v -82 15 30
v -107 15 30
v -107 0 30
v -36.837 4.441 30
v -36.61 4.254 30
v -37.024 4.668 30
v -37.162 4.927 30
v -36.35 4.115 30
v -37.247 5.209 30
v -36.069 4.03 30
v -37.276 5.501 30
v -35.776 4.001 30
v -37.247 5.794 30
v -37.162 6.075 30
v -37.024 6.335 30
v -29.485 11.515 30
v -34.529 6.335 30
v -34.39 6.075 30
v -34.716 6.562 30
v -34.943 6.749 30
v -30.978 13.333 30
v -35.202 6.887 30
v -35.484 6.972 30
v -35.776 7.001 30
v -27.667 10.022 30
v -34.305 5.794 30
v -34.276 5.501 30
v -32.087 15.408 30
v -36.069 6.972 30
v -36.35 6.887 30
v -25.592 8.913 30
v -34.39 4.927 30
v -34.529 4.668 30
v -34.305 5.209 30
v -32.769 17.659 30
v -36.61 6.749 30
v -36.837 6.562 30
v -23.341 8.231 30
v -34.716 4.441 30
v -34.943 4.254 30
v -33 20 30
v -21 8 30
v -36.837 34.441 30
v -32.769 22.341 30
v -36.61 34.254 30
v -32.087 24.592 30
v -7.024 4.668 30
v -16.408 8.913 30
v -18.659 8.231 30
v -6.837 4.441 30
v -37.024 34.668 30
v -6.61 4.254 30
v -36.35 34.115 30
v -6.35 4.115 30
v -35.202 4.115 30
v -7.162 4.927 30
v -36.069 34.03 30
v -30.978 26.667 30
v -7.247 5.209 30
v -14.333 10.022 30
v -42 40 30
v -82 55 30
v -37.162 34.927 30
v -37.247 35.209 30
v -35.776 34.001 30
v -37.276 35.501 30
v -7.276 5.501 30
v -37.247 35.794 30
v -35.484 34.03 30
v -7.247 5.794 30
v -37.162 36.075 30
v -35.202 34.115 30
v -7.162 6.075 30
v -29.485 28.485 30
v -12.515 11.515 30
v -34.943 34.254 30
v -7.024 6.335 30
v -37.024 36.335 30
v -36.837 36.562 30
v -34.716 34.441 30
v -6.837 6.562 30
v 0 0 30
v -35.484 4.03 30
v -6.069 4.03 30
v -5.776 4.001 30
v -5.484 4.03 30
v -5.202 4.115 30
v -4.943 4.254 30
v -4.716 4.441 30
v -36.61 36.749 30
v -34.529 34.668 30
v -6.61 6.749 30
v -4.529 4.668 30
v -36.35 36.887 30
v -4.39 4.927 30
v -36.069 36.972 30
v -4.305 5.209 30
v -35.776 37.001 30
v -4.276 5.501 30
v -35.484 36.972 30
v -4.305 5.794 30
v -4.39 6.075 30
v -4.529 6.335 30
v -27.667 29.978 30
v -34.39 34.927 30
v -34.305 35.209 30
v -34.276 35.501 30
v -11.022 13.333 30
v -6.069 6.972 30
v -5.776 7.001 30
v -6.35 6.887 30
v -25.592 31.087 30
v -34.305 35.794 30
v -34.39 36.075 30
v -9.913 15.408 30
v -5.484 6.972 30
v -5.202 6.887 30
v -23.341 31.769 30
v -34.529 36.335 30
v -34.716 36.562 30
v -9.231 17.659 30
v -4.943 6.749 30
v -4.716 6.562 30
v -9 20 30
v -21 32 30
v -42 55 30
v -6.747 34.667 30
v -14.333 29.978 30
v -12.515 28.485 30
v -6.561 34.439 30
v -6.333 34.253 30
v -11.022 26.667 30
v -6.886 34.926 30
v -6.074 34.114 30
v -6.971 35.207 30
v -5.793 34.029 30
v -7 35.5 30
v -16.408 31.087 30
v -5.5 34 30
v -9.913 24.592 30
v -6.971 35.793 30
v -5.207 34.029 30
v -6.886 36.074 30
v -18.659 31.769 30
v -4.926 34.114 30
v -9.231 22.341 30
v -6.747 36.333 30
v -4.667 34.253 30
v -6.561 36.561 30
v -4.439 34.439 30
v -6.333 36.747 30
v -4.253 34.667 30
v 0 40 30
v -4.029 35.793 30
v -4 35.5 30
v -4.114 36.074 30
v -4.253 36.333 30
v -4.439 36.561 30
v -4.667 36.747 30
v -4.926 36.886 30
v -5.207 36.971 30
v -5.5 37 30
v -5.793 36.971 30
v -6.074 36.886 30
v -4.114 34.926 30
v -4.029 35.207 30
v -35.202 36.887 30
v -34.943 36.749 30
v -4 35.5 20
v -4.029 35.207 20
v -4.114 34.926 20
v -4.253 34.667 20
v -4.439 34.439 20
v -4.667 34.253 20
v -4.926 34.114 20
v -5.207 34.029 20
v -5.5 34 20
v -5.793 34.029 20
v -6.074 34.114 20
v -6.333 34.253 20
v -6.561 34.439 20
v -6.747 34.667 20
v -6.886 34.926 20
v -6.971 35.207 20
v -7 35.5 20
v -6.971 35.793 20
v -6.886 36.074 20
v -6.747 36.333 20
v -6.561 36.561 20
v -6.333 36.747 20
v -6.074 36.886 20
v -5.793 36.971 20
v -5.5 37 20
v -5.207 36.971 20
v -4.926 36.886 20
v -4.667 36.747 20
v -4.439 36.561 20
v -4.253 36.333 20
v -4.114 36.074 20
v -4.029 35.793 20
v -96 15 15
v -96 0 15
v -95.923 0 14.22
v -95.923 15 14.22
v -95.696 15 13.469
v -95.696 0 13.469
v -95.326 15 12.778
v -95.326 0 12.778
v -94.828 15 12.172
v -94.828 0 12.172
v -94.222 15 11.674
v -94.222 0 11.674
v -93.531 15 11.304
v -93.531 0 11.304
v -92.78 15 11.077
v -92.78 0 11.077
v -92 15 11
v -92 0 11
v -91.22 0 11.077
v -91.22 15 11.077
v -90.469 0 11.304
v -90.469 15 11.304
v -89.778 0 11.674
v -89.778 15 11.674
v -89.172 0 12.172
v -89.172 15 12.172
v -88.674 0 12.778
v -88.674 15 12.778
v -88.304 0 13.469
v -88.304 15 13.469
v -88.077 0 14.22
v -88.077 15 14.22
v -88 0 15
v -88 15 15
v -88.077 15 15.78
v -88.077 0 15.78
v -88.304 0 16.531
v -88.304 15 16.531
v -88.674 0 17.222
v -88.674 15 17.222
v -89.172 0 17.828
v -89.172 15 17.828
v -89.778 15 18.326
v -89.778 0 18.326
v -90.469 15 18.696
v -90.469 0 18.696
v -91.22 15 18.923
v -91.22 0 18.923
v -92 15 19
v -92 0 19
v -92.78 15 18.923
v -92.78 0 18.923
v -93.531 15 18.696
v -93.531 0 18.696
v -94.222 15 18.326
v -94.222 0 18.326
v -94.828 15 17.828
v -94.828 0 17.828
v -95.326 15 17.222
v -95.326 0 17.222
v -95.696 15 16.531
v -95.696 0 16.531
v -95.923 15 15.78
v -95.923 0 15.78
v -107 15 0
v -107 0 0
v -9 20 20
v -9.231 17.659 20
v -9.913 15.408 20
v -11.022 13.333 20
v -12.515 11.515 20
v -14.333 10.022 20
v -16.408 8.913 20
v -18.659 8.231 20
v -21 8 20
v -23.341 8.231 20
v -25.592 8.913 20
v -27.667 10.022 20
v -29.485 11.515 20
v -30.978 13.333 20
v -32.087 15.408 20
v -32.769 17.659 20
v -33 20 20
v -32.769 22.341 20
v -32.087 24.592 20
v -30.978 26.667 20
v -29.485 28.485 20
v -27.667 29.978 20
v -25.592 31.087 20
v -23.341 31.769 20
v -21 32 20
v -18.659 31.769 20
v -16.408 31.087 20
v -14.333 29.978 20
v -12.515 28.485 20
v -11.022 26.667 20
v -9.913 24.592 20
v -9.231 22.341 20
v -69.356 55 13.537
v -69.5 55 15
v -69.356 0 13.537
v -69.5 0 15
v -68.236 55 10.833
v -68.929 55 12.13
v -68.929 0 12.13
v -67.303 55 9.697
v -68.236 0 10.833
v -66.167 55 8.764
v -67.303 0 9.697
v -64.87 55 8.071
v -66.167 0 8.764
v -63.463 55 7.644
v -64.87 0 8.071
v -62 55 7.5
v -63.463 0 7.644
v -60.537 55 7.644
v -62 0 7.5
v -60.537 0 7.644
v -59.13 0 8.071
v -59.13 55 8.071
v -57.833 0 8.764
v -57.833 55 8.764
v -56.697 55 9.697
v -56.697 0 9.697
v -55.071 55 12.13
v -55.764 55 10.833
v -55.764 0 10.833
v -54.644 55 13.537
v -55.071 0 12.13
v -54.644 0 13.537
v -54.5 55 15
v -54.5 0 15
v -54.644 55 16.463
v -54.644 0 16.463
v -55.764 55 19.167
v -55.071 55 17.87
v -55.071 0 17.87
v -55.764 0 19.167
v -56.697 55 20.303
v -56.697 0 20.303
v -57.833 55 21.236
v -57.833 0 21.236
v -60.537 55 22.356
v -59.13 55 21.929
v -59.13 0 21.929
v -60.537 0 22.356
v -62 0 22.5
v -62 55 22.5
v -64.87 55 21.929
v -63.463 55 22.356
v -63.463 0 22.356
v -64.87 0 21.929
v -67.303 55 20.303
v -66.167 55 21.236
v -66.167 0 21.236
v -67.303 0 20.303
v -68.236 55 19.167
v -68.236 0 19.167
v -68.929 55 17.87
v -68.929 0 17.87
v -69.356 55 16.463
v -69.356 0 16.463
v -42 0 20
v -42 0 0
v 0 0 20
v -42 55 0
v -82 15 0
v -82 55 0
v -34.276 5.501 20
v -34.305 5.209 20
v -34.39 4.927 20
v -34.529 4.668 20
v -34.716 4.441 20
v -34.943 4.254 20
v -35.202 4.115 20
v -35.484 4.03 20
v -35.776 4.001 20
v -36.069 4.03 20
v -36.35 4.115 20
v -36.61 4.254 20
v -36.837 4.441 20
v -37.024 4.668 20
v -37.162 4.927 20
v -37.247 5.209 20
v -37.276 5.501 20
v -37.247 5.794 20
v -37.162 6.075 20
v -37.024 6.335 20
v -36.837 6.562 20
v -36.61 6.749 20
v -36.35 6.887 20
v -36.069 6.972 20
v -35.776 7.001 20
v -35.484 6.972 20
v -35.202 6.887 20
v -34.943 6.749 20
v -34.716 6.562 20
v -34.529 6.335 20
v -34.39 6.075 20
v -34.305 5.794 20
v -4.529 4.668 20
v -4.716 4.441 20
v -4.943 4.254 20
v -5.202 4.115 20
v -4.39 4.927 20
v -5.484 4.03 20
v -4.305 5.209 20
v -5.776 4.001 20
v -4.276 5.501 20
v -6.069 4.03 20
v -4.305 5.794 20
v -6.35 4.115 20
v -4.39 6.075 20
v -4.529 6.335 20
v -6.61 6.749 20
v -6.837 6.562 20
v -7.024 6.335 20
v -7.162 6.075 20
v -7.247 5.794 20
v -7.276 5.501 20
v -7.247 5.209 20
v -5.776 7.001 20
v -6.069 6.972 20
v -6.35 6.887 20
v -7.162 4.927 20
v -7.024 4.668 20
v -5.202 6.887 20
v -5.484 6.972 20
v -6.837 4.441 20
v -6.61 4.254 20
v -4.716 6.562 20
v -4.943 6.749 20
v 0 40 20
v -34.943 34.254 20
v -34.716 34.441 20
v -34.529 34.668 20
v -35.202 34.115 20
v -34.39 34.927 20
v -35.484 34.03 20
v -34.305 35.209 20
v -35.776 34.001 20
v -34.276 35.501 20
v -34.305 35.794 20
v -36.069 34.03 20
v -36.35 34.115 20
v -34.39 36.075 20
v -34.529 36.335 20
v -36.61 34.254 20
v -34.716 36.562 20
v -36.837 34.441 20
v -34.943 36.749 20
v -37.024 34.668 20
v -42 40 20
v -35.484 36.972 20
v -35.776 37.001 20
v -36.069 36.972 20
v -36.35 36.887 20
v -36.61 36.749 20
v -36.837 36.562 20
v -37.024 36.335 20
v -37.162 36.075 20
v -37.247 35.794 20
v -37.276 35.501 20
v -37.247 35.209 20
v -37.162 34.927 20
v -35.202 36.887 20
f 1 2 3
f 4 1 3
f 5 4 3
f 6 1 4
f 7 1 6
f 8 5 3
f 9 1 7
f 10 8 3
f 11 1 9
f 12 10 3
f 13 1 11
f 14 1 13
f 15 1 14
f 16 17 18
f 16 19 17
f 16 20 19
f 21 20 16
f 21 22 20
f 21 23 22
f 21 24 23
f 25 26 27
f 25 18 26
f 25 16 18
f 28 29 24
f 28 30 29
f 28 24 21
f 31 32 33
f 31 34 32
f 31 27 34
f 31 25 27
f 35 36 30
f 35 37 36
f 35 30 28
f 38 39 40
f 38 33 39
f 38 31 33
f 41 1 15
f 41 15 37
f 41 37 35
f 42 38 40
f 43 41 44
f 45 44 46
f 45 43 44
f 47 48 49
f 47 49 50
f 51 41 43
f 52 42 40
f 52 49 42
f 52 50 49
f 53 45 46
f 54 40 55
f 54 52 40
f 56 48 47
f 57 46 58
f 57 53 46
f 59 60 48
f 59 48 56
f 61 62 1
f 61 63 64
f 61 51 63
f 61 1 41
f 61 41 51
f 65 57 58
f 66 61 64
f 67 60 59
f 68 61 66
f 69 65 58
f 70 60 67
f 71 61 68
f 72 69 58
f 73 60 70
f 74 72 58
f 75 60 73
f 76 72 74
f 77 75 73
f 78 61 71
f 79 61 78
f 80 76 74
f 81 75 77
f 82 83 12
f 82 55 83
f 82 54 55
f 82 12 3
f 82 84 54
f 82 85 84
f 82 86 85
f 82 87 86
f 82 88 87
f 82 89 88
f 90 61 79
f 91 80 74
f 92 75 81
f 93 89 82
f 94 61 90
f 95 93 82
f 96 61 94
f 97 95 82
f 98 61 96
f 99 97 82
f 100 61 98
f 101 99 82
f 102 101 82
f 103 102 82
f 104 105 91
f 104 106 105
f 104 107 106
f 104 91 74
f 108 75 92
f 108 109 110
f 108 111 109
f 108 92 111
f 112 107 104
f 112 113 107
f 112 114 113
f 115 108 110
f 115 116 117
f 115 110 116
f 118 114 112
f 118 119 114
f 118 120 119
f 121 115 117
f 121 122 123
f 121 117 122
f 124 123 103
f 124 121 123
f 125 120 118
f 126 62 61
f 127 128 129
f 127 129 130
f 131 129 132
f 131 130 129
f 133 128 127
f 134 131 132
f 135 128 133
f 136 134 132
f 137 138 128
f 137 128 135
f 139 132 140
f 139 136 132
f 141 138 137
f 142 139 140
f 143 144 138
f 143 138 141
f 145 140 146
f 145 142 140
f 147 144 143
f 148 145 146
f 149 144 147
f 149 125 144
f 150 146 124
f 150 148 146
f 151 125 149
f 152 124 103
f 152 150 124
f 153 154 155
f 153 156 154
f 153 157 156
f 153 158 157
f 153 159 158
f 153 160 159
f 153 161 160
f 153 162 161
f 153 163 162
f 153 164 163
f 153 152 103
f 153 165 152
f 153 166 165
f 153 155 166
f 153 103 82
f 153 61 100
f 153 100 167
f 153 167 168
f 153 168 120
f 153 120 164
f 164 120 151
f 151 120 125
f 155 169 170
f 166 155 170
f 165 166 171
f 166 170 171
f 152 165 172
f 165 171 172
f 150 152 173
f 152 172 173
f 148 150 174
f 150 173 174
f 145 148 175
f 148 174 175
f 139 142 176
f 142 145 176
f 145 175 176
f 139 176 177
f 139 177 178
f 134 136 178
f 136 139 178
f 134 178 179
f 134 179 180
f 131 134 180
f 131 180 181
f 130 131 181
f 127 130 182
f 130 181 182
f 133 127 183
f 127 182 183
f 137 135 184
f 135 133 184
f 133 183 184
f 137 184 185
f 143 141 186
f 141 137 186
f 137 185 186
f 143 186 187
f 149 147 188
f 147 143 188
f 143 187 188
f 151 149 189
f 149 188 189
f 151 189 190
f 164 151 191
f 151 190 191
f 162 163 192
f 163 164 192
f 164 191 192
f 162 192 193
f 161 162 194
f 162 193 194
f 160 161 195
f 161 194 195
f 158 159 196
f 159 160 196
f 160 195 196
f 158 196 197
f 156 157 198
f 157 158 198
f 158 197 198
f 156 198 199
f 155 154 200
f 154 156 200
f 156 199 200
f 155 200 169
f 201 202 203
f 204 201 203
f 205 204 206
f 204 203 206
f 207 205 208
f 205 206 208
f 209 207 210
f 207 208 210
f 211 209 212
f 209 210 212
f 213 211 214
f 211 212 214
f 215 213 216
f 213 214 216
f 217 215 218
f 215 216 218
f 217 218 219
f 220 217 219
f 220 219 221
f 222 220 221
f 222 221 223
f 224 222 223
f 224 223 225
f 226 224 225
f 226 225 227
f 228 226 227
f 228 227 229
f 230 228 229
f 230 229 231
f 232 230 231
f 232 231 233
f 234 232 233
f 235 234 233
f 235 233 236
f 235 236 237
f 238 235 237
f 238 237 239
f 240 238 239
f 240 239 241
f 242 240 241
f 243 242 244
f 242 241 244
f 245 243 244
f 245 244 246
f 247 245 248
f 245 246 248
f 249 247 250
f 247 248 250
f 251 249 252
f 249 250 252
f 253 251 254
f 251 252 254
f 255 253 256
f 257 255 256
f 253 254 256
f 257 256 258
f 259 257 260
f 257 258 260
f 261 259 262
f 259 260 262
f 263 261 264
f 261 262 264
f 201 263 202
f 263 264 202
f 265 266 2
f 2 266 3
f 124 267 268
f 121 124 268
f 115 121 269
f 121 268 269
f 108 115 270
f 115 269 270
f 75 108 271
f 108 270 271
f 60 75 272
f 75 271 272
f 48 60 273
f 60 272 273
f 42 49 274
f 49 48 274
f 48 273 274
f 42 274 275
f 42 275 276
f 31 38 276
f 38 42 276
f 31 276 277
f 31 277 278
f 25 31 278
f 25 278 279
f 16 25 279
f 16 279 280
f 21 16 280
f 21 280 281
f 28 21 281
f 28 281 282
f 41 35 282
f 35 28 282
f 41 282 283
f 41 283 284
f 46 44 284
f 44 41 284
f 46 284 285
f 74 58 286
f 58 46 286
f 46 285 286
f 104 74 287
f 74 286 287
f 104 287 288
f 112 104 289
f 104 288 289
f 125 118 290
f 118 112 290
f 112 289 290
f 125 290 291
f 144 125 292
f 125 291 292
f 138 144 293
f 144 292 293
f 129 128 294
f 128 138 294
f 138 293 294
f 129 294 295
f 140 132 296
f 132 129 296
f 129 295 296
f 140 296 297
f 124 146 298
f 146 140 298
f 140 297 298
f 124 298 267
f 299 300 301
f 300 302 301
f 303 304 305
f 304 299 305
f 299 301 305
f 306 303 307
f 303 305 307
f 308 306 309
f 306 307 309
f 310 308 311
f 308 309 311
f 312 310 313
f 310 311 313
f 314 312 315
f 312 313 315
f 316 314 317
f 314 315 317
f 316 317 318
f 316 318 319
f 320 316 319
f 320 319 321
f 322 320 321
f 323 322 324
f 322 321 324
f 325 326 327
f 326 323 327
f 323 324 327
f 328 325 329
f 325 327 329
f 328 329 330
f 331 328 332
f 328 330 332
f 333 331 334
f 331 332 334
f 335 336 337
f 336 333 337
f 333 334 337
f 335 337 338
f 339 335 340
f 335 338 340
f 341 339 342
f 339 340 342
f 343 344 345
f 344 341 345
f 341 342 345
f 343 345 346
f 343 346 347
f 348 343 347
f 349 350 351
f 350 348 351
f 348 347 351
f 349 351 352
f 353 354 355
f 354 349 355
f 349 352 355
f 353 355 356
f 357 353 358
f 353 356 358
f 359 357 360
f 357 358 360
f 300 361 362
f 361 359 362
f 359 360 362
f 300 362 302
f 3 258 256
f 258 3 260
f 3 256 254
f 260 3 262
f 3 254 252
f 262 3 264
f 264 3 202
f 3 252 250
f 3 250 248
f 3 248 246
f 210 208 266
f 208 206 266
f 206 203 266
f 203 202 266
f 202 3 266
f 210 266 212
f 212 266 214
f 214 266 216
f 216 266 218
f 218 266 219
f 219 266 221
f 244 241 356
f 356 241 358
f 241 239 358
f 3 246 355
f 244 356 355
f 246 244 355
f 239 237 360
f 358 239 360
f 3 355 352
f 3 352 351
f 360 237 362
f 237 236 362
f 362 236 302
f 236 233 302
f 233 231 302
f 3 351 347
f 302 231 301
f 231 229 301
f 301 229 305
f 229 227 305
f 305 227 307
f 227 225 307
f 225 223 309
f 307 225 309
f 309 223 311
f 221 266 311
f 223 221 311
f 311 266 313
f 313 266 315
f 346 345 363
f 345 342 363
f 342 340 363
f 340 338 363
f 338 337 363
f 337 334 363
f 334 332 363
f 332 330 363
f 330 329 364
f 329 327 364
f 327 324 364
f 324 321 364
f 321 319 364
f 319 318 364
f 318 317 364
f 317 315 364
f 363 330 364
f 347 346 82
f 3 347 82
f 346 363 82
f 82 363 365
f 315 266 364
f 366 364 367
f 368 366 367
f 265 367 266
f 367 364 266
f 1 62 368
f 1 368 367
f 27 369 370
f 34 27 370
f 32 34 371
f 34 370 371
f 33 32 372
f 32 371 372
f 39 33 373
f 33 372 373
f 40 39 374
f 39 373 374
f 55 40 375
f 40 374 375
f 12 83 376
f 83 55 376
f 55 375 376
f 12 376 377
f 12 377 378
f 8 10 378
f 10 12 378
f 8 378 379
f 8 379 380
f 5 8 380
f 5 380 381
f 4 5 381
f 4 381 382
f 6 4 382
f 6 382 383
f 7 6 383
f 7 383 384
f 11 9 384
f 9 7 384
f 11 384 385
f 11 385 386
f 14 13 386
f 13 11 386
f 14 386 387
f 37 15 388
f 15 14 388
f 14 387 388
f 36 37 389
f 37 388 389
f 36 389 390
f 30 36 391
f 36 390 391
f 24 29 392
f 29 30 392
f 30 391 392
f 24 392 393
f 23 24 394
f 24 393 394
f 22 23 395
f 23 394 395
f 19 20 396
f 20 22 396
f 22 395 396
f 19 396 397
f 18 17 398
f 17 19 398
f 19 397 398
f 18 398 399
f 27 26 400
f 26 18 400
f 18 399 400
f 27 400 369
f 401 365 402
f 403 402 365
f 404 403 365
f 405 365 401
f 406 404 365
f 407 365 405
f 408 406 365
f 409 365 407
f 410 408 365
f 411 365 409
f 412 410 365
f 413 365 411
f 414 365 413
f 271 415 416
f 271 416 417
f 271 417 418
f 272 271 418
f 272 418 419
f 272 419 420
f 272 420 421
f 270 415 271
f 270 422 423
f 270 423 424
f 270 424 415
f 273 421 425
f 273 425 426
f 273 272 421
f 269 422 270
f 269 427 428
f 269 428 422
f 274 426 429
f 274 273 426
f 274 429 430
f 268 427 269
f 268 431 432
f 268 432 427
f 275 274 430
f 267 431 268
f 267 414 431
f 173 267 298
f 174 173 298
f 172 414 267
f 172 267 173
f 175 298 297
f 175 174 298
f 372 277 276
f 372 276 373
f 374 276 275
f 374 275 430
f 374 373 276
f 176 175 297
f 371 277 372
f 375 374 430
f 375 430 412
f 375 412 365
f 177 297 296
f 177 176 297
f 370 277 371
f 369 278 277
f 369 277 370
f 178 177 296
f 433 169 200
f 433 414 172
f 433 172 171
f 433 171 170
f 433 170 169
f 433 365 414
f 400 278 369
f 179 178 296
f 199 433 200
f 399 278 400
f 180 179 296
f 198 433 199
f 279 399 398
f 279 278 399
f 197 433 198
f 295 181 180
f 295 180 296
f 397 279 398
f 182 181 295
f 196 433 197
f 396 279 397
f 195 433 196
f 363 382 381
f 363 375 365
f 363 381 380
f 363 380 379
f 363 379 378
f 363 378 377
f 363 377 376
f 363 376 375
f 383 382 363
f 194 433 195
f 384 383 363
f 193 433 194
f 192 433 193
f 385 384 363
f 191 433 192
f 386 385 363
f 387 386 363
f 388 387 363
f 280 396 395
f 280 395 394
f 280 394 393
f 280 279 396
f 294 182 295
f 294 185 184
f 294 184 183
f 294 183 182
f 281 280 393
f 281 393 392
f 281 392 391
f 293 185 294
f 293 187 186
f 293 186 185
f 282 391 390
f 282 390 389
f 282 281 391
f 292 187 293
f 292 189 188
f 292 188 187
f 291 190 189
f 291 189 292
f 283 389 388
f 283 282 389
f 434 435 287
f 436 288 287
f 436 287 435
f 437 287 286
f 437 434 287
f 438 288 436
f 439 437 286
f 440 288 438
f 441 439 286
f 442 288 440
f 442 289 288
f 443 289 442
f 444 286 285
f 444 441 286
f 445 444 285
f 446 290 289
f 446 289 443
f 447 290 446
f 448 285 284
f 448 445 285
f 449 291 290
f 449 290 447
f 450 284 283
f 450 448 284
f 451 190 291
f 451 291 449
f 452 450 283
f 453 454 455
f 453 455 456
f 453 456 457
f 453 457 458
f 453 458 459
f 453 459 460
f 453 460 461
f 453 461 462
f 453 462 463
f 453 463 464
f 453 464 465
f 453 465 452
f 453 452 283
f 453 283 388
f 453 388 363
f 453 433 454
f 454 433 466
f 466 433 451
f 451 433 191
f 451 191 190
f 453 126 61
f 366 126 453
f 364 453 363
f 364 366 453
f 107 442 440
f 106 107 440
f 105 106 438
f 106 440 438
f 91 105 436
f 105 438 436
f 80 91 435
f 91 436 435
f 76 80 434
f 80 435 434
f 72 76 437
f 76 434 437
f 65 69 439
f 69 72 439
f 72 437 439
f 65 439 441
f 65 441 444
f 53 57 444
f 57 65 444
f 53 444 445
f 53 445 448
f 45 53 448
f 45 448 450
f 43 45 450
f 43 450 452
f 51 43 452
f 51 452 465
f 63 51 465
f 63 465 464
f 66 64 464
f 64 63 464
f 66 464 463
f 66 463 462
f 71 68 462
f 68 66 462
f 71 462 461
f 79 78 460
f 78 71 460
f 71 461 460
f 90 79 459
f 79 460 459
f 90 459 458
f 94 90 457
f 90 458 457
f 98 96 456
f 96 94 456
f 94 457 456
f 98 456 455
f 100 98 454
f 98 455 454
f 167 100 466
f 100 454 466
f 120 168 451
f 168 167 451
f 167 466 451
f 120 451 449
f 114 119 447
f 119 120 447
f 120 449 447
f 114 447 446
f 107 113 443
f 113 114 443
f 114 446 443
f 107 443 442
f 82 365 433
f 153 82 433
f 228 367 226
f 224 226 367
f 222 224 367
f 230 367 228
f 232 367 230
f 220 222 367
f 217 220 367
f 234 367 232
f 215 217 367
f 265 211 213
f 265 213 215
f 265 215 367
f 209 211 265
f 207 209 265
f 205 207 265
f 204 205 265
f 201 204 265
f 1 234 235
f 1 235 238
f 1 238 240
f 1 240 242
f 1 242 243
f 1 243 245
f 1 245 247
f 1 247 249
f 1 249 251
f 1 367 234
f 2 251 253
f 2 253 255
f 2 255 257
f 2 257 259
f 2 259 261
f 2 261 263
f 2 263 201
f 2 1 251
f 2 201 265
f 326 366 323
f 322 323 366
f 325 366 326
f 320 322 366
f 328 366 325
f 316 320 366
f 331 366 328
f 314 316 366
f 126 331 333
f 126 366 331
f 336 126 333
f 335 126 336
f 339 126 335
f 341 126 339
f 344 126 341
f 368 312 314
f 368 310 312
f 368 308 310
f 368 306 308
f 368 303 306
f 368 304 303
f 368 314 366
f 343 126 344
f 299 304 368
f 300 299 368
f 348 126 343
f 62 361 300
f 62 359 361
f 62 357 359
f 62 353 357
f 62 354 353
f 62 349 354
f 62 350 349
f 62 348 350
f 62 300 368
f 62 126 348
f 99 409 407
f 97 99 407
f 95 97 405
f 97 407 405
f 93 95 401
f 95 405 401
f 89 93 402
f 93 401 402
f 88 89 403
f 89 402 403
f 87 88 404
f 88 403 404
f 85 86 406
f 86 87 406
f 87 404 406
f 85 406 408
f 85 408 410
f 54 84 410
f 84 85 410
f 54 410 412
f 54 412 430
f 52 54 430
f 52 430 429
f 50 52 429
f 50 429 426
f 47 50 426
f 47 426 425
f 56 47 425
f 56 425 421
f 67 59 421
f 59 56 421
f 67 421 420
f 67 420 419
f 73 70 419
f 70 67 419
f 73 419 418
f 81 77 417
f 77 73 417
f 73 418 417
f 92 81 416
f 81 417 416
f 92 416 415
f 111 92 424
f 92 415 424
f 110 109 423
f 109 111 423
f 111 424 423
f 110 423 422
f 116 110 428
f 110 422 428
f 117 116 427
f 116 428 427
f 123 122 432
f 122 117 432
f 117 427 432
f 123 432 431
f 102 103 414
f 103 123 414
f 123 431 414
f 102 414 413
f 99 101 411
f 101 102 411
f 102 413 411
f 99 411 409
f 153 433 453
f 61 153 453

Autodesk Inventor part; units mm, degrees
ref_plane "YZ Plane" through (0, 0, 0) normal (1, 0, 0) x (0, 1, 0)
ref_plane "XZ Plane" through (0, 0, 0) normal (0, 1, 0) x (-1, 0, 0)
ref_plane "XY Plane" through (0, 0, 0) normal (0, 0, 1) x (1, 0, 0)
sketch "Sketch1" plane through (0, 0, 0) normal (0, 1, 0) x (-1, 0, 0)
  line L0 (0, 0) -> (107, 0)
  line L1 (107, 0) -> (107, 30)
  line L2 (107, 30) -> (42, 30)
  line L3 (0, 20) -> (0, 0)
  line L4 (42, 30) -> (42, 20)
  line L5 (42, 20) -> (0, 20)
  circle A0 centre (62, 15) radius 7.5
  circle A1 centre (92, 15) radius 4
  dimension "d6" = 15
  dimension "d7" = 8
extrude "Extrusion1" add sketch "Sketch1" along normal blind 55
sketch "Sketch2" plane through (-107, 0, 30) normal (0, 0, 1) x (1, 0, 0)
  line L0 (0, 55) -> (25, 55)
  line L1 (25, 55) -> (25, 15)
  line L2 (25, 15) -> (0, 15)
  line L3 (0, 15) -> (0, 55)
  point P0 (107, 0)
  dimension "d10" = 25
  dimension "d11" = 40
extrude "Extrusion2" cut sketch "Sketch2" against normal blind 55
sketch "Sketch3" plane through (-42, 0, 20) normal (0, 0, 1) x (1, 0, 0)
  line L0 (0, 55) -> (42, 55)
  line L1 (42, 55) -> (42, 40)
  line L2 (42, 40) -> (0, 40)
  line L3 (0, 40) -> (0, 55)
  circle A0 centre (21, 20) radius 12
  circle A1 centre (6.2237, 35.5013) radius 1.5
  circle A2 centre (36.5, 35.5) radius 1.5
  circle A3 centre (36.2237, 5.5013) radius 1.5
  circle A4 centre (6.2237, 5.5013) radius 1.5
  dimension "d14" = 42
  dimension "d15" = 15
  dimension "d16" = 24
  dimension "d22" = 3
  dimension "d23" = 3
  dimension "d24" = 3
  dimension "d25" = 3
extrude "Extrusion3" cut sketch "Sketch3" against normal blind 55
sketch "Sketch4" plane through (-42, 0, 20) normal (0, 0, 1) x (1, 0, 0)
  line L0 (42, 40) -> (0, 40) projected
  line L1 (0, 0) -> (0, 40) projected
  line L2 (0, 0) -> (42, 0) projected
  line L3 (42, 0) -> (42, 40) projected
  circle A0 centre (21, 20) radius 12 projected
  circle A1 centre (36.2237, 5.5013) radius 1.5 projected
  circle A2 centre (6.2237, 35.5013) radius 1.5 projected
  circle A3 centre (36.5, 35.5) radius 1.5 projected
  circle A4 centre (6.2237, 5.5013) radius 1.5 projected
extrude "Extrusion4" add sketch "Sketch4" along normal blind 10
sketch "Sketch5" plane through (0, 0, 0) normal (0, 0, -1) x (-1, 0, 0)
  line L0 (42, 40) -> (0, 40) projected
  line L1 (0, 0) -> (0, 40) projected
  line L2 (0, 0) -> (107, 0) projected
  circle A0 centre (35.7763, 5.5013) radius 1.5 projected
  circle A1 centre (5.5, 35.5) radius 1.5 projected
  circle A2 centre (35.7763, 35.5013) radius 1.5 projected
  circle A3 centre (5.7763, 5.5013) radius 1.5 projected
  circle A4 centre (21, 20) radius 12 projected
  line L3 (42, 40) -> (42, 0)
extrude "Extrusion5" cut sketch "Sketch5" against normal blind 20
properties part number "X_Top_MotorSide_V3" material "Birch"
